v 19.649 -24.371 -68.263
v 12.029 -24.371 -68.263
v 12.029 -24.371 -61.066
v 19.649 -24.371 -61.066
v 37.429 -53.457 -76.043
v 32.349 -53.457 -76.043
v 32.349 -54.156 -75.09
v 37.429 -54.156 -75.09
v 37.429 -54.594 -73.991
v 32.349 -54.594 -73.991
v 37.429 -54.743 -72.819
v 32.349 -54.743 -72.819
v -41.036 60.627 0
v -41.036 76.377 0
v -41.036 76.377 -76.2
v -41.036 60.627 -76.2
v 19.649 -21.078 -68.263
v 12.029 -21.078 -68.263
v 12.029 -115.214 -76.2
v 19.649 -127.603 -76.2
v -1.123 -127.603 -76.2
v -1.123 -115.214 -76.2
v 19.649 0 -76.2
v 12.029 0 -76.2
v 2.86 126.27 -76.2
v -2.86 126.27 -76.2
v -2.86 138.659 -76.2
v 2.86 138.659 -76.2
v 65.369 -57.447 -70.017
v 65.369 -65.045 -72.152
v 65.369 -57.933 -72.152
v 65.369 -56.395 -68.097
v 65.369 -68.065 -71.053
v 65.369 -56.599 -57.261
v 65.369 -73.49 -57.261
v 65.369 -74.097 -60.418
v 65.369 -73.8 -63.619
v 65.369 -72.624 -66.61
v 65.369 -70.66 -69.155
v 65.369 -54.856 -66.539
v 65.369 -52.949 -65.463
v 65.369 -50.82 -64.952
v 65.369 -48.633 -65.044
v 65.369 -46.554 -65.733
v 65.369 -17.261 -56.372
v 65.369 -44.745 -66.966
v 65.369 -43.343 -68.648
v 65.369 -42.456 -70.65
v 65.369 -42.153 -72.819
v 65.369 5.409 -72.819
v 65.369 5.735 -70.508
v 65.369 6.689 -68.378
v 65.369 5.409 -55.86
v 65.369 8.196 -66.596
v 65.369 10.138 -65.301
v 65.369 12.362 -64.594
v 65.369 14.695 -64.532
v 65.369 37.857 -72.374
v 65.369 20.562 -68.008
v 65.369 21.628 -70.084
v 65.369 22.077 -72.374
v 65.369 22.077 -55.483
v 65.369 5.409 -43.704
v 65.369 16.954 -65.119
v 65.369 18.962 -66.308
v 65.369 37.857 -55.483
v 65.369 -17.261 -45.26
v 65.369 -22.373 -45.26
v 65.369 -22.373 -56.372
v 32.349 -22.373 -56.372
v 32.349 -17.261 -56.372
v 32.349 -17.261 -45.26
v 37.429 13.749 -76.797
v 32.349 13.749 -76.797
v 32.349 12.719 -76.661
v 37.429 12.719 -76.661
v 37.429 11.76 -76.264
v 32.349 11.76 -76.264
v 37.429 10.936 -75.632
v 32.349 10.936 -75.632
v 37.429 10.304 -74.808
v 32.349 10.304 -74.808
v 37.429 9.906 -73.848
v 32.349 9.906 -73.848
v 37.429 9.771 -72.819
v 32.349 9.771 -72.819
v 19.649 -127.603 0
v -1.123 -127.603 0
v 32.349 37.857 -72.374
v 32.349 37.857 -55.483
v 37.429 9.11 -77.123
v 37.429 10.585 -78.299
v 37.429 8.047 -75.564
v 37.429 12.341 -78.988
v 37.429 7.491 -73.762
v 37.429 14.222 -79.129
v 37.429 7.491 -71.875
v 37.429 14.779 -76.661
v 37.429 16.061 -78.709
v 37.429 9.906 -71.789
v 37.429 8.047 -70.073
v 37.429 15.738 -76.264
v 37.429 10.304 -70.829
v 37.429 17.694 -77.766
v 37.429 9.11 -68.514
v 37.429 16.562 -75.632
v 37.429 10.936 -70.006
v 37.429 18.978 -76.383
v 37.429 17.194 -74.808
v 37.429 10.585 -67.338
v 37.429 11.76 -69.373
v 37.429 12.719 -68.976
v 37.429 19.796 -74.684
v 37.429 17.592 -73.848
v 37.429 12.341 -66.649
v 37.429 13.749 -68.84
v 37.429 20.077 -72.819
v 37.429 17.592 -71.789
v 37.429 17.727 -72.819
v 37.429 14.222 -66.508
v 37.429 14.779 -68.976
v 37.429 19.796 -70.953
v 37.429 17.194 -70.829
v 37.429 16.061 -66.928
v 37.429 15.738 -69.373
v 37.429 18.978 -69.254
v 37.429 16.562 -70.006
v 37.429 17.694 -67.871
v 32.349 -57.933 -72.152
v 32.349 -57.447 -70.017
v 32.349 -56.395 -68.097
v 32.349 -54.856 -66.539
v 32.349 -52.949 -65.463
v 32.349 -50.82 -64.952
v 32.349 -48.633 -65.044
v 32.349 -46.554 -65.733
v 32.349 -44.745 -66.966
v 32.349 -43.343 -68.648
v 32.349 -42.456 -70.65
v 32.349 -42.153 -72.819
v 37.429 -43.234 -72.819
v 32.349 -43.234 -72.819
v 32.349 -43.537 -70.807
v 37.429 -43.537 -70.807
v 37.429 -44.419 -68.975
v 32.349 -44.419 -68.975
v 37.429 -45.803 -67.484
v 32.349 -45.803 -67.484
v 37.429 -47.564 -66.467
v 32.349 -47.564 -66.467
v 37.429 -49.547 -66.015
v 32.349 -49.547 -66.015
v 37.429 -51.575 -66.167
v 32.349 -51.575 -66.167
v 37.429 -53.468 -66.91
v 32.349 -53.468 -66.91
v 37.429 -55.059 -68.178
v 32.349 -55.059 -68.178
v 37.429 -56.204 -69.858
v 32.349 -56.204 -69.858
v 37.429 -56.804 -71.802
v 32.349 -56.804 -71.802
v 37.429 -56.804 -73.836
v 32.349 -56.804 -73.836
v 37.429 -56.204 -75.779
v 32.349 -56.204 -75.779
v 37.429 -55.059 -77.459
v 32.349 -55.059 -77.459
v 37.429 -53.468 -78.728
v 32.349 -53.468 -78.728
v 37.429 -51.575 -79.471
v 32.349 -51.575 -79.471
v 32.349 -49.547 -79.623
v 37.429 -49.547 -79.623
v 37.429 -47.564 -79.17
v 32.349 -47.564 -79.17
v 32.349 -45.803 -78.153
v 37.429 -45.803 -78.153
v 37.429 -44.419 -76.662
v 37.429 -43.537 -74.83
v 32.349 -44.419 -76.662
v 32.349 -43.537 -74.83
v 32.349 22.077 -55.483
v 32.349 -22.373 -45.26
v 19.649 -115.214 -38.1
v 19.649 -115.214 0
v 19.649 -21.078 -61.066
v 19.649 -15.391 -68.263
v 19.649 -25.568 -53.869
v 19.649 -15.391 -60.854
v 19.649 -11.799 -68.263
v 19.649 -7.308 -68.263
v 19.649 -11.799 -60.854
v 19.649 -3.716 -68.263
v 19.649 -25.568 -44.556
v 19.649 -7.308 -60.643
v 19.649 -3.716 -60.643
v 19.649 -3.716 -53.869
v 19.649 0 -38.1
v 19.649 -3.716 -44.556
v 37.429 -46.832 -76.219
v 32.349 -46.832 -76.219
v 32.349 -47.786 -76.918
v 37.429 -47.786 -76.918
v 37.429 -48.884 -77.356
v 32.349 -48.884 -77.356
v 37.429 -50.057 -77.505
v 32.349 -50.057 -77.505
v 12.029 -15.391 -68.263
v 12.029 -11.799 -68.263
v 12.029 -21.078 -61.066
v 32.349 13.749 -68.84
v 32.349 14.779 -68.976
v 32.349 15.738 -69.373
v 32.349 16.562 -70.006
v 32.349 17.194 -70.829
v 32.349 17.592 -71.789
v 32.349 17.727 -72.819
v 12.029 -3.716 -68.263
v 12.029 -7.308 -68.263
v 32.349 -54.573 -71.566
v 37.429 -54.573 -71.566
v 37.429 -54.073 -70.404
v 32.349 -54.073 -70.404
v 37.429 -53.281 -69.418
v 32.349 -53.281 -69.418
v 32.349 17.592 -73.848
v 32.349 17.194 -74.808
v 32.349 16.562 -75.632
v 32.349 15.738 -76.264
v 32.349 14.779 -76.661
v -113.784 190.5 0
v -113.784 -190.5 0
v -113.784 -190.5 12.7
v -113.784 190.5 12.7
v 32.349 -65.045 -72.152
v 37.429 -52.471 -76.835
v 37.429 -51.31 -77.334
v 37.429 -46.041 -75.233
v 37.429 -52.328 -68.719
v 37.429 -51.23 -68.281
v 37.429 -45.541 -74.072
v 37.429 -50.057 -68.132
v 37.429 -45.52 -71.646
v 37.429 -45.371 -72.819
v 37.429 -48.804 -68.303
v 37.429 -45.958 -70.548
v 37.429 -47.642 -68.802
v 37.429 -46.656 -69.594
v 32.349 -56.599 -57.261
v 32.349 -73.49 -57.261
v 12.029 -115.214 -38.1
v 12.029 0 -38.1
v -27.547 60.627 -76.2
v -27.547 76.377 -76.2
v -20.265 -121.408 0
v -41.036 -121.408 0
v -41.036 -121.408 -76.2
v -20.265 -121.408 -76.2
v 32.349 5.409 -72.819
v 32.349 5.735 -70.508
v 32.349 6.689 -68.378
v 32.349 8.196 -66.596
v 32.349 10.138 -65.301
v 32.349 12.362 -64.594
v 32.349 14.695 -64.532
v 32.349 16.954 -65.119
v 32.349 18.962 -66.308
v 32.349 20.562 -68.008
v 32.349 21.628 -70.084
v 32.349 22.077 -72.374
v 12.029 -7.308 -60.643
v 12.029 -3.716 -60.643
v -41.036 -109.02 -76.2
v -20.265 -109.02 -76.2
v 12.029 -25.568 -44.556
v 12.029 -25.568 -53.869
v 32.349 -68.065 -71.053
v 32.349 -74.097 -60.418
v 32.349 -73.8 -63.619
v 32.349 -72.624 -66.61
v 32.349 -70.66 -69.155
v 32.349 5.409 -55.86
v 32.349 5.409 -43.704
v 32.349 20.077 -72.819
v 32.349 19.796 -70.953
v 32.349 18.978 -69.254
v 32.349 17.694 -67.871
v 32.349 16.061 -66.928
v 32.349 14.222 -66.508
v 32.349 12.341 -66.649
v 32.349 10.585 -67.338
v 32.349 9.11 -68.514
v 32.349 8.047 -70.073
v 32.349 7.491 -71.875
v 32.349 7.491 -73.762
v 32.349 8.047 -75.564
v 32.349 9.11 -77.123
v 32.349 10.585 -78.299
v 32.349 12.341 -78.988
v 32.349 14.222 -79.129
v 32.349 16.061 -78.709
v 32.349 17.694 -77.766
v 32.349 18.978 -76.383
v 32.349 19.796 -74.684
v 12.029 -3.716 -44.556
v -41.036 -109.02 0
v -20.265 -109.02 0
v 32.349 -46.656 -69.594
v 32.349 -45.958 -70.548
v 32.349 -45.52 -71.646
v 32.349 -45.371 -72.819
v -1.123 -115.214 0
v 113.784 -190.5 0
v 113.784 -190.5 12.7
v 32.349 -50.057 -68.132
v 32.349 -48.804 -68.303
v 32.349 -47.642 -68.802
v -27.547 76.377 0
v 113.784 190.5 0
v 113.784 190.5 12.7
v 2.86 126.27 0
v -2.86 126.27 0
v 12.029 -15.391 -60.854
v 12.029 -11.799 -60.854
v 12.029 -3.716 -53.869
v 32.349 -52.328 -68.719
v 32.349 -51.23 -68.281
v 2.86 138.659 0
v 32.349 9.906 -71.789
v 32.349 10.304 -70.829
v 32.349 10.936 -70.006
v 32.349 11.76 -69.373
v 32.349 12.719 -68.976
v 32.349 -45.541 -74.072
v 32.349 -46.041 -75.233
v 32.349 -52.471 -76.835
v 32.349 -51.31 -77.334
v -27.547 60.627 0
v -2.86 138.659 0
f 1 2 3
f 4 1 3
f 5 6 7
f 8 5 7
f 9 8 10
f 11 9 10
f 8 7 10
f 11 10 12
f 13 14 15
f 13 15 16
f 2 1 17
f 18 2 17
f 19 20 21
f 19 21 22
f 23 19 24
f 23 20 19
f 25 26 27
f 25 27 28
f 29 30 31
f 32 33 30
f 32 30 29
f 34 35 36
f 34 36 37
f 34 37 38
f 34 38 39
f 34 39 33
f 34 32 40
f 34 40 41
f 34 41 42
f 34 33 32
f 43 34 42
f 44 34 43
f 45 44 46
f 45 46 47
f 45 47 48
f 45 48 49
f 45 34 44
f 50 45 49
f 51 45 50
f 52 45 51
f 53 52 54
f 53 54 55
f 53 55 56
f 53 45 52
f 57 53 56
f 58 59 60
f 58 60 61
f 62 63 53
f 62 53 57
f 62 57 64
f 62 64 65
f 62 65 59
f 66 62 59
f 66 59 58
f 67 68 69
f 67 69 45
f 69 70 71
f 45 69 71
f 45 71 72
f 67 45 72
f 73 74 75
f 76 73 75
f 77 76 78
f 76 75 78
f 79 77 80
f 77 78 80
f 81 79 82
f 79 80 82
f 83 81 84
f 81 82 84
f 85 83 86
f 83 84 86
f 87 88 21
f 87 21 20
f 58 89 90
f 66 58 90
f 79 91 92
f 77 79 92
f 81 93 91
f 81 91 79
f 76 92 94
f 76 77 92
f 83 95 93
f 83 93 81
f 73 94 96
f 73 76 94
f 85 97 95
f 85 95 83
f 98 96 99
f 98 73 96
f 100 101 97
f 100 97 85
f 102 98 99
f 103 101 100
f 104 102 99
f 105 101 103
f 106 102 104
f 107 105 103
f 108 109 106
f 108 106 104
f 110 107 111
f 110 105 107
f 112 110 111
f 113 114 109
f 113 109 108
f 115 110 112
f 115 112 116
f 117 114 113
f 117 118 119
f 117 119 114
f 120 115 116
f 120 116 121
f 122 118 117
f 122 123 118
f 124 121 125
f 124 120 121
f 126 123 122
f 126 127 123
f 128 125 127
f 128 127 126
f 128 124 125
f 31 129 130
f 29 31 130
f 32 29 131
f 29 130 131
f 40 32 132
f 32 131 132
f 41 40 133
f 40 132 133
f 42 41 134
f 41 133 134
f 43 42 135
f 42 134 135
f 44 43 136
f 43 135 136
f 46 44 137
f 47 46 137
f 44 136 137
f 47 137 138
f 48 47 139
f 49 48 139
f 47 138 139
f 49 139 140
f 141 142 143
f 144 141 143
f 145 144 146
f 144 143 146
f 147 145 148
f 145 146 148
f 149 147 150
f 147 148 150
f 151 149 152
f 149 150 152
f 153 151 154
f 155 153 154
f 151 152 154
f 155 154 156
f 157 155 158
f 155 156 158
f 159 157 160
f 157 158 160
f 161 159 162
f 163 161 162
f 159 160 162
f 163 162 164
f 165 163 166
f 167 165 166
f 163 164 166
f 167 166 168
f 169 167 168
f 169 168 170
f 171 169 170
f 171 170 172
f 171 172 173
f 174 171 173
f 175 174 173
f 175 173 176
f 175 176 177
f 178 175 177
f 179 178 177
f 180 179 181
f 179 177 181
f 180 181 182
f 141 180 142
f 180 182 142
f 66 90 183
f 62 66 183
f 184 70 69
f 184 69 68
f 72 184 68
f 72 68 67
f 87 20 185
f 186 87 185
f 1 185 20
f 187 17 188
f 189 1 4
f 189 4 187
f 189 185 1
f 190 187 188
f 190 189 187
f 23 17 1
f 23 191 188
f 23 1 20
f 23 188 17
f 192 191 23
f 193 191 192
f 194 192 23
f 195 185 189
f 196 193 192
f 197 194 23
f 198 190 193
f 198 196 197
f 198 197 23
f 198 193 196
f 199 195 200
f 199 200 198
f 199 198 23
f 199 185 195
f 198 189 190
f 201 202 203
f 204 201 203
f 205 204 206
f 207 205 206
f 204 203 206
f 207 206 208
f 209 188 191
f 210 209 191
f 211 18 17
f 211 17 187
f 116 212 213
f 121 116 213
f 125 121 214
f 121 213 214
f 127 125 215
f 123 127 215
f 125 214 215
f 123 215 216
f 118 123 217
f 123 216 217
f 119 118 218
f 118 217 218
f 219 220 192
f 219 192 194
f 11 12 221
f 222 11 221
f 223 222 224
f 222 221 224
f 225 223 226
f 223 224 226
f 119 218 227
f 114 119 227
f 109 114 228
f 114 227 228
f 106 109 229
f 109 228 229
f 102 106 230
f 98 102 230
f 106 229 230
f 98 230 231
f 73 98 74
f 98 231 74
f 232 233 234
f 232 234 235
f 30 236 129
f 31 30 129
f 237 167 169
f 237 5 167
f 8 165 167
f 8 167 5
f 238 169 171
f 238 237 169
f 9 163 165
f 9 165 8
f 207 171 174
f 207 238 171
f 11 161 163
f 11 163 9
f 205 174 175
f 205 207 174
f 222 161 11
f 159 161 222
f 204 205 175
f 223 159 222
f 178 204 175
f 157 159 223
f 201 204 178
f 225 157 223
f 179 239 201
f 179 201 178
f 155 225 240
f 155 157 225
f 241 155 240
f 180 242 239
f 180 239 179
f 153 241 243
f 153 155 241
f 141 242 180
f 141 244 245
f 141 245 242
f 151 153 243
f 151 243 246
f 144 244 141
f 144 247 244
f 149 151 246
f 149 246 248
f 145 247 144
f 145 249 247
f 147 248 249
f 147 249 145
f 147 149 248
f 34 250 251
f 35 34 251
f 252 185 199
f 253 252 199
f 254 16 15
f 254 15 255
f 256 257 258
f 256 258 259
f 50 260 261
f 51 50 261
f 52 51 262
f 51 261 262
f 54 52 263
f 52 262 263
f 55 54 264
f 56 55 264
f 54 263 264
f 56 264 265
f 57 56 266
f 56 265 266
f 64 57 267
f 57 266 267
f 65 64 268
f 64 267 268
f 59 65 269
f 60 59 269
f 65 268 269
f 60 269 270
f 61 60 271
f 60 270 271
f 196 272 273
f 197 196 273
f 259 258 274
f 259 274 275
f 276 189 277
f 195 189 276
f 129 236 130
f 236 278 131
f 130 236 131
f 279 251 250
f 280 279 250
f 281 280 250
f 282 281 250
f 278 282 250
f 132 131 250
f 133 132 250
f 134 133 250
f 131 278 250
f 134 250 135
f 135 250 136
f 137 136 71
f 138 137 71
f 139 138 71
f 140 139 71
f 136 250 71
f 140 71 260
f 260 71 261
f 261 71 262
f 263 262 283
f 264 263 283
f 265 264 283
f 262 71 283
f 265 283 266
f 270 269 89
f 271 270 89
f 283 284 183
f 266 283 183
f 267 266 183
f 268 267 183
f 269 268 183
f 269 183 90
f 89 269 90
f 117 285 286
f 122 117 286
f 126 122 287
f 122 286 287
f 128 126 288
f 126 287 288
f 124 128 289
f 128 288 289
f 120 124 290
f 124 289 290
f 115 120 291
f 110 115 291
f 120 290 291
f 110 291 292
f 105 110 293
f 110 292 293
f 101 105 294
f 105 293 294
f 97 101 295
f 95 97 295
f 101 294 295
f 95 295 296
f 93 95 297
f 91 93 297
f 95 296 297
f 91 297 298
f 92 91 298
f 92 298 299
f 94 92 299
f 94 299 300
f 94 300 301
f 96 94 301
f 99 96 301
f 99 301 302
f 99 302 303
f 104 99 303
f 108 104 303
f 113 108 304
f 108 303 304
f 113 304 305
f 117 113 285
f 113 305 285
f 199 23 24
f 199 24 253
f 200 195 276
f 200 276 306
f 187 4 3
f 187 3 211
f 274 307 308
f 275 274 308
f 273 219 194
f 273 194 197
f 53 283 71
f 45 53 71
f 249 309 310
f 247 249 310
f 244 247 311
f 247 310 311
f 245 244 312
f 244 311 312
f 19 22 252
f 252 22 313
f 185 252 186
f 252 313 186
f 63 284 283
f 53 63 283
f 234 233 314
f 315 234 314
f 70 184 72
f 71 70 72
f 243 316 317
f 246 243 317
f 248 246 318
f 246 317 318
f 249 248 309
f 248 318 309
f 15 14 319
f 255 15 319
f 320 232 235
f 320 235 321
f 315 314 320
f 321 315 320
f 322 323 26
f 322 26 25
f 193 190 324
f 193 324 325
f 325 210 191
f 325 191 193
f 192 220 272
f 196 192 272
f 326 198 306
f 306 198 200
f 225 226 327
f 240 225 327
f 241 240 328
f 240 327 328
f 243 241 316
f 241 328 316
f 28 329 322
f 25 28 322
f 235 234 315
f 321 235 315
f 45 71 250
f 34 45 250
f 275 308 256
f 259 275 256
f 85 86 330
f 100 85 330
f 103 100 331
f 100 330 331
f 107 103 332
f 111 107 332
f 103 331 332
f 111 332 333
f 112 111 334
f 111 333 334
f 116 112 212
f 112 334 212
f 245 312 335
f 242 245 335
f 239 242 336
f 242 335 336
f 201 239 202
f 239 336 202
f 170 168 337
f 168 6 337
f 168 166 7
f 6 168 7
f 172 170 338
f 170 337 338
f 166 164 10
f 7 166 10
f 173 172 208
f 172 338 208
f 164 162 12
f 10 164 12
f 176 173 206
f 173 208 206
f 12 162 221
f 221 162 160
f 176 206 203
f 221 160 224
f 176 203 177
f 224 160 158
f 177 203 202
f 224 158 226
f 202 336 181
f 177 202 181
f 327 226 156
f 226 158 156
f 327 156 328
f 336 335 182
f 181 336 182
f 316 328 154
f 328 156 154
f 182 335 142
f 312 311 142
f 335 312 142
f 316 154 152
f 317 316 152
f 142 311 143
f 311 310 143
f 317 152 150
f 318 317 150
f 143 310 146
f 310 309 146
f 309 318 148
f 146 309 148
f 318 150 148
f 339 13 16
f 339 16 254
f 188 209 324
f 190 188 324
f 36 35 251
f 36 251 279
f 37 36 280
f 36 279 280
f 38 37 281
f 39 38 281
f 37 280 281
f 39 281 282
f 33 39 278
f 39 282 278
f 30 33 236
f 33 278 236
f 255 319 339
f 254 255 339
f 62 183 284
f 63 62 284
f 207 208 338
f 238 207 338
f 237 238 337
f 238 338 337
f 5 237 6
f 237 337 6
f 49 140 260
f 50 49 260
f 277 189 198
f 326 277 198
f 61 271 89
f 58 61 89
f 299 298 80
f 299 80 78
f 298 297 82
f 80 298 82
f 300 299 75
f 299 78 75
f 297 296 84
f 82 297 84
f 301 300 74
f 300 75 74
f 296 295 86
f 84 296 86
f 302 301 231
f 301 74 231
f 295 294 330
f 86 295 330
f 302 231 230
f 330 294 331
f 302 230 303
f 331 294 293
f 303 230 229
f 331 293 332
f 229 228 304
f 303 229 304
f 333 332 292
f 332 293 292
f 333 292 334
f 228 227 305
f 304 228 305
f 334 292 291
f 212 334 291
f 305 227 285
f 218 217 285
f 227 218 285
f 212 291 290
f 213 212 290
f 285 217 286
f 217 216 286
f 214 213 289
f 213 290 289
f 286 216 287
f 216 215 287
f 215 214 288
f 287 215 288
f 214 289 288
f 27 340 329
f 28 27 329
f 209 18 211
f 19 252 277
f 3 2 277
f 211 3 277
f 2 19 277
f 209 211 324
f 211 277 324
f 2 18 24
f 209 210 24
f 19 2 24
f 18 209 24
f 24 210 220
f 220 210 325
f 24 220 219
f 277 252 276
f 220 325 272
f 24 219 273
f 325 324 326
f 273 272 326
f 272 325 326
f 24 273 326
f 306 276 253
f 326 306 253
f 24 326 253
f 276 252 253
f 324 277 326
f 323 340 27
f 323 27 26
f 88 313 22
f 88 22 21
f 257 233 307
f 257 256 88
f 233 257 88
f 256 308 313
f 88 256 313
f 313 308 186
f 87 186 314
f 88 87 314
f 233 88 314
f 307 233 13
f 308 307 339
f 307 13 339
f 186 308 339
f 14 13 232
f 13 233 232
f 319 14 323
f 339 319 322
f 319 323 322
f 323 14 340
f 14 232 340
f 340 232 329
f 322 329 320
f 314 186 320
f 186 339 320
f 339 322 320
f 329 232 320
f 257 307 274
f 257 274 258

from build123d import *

# Parameters (mm, degrees)
F0_W      = 227.5685612466
F0_H      = 381
F1_DEPTH  = 12.7
F2_W      = 5.7198144495
F2_H      = 12.3888067901
F2_W_2    = 13.4890703484
F2_H_2    = 15.7491192222
F3_DEPTH  = 25.4
F2_W_3    = 20.7718969323
F4_DEPTH  = 76.2
F5_W      = 115.214029327
F5_H      = 38.1
F6_DEPTH  = 7.62
F7_W      = 21.851953119
F7_H      = 9.3133300543
F7_W_2    = 3.2927580178
F7_H_2    = 7.1966685355
F7_W_3    = 3.5920999944
F7_H_3    = 7.4083320796
F7_W_4    = 3.5921037197
F7_H_4    = 7.6199993491
F8_DEPTH  = 133.4340272107
F12_DEPTH = 33.02
F11_W     = 5.1117502153
F11_H     = 11.1124999821
F11_R     = 6.8230577634
F13_DEPTH = 5.08
F11_R_2   = 6.3281995519
F14_DEPTH = 33.02


with BuildPart() as f1:
    # F0 (on Top) → F1 (new body)
    with BuildSketch(Plane.XY):
        Rectangle(F0_W, F0_H)
    extrude(amount=F1_DEPTH)

    # F2 (on face) → F3 (join)
    with BuildSketch(Plane(origin=(0, 0, 0), x_dir=(1, 0, 0), z_dir=(0, 0, -1))):
        with Locations((0, -132.4641108513)):
            Rectangle(F2_W, F2_H)
        with Locations((-34.2918671668, -68.5019493103)):
            Rectangle(F2_W_2, F2_H_2)
    extrude(amount=F3_DEPTH)

    # F2 (on face) → F4 (join)
    with BuildSketch(Plane(origin=(0, 0, 0), x_dir=(1, 0, 0), z_dir=(0, 0, -1))):
        with Locations((0, -132.4641108513)):
            Rectangle(F2_W, F2_H)
        with Locations((-34.2918671668, -68.5019493103)):
            Rectangle(F2_W_2, F2_H_2)
        with Locations((9.2627981212, 121.4084327221)):
            Rectangle(F2_W_3, F2_H)
        with Locations((-30.6504538748, 115.214029327)):
            Rectangle(F2_W_3, F2_H)
    extrude(amount=F4_DEPTH)

    # F5 (on face) → F6 (join)
    with BuildSketch(Plane.YZ.offset(19.6487465873)):
        with Locations((-57.6070146635, -57.15)):
            Rectangle(F5_W, F5_H)
    extrude(amount=-F6_DEPTH)

    # F7 (on face) → F8 (cut, through all)
    with BuildSketch(Plane.YZ.offset(19.6487465873)):
        with Locations((-14.6423373371, -49.212500453)):
            Rectangle(F7_W, F7_H)
        with Locations((-22.7245669812, -64.6641682833)):
            Rectangle(F7_W_2, F7_H_2)
        with Locations((-13.5946366936, -64.5583365113)):
            Rectangle(F7_W_3, F7_H_3)
        with Locations((-5.5124126375, -64.4525028765)):
            Rectangle(F7_W_4, F7_H_4)
    extrude(amount=-F8_DEPTH, mode=Mode.SUBTRACT)


with BuildPart() as f12:
    # F11 (on offset) → F12 (new body)
    with BuildSketch(Plane.YZ.offset(32.3487465873)):
        with BuildLine():
            ThreePointArc((-57.9326376319, -72.151876986), (-49.7231741627, -64.9217132577), (-42.1528853476, -72.8186294436))
            Line((-42.1528853476, -72.8186294436), (5.4086139426, -72.8186294436))
            Line((5.4086139426, -72.8186294436), (5.4086139426, -55.8598177097))
            Line((5.4086139426, -55.8598177097), (-17.2608867288, -56.3721247017))
            Line((-17.2608867288, -56.3721247017), (-56.5991364419, -57.2611279786))
            Line((-56.5991364419, -57.2611279786), (-73.4901353717, -57.2611279786))
            ThreePointArc((-73.4901353717, -57.2611279786), (-72.6236893565, -66.6100777312), (-65.0446359068, -72.151876986))
            Line((-65.0446359068, -72.151876986), (-57.9326376319, -72.151876986))
        make_face()
        with BuildLine():
            Line((5.4086139426, -55.8598177097), (5.4086139426, -72.8186294436))
            ThreePointArc((5.4086139426, -72.8186294436), (13.5265818153, -64.4812919947), (22.0773629844, -72.3741203547))
            Line((22.0773629844, -72.3741203547), (37.8571152687, -72.3741203547))
            Line((37.8571152687, -72.3741203547), (37.8571152687, -55.4831214249))
            Line((37.8571152687, -55.4831214249), (22.0773629844, -55.4831214249))
            Line((22.0773629844, -55.4831214249), (5.4086139426, -55.8598177097))
        make_face()
    extrude(amount=F12_DEPTH)

    # F11 (on offset) → F14 (join)
    with BuildSketch(Plane.YZ.offset(32.3487465873)):
        Polygon((5.4086139426, -43.7038764358), (5.4086139426, -55.8598177097), (22.0773629844, -55.4831214249), align=None)
    extrude(amount=F14_DEPTH)


with BuildPart() as f12b:
    # F11 (on offset) → F12, piece 2 (new body)
    with BuildSketch(Plane.YZ.offset(32.3487465873)):
        with Locations((-19.8167618364, -50.8158747107)):
            Rectangle(F11_W, F11_H)
    extrude(amount=F12_DEPTH)


with BuildPart() as f13:
    # F11 (on offset) → F13 (new body)
    with BuildSketch(Plane.YZ.offset(32.3487465873)):
        with Locations((-50.0568478592, -72.8186294436)):
            Circle(F11_R)
        with BuildLine():
            ThreePointArc((-46.6563293903, -69.5941245821), (-45.703880836, -71.0829348983), (-45.3705958963, -72.8186294436))
            ThreePointArc((-45.3705958963, -72.8186294436), (-45.7515139757, -74.6693205609), (-46.8323429976, -76.2191479125))
            ThreePointArc((-46.8323429976, -76.2191479125), (-48.3211533138, -77.1715964668), (-50.0568478592, -77.5048814065))
            ThreePointArc((-50.0568478592, -77.5048814065), (-51.9075389764, -77.1239633271), (-53.4573663281, -76.0431343052))
            ThreePointArc((-53.4573663281, -76.0431343052), (-54.4098148823, -74.554323989), (-54.743099822, -72.8186294436))
            ThreePointArc((-54.743099822, -72.8186294436), (-54.3621817426, -70.9679383264), (-53.2813527207, -69.4181109747))
            ThreePointArc((-53.2813527207, -69.4181109747), (-51.7925424045, -68.4656624205), (-50.0568478592, -68.1323774808))
            ThreePointArc((-50.0568478592, -68.1323774808), (-48.2061567419, -68.5132955602), (-46.6563293903, -69.5941245821))
        make_face(mode=Mode.SUBTRACT)
    extrude(amount=F13_DEPTH)


with BuildPart() as f13b:
    # F11 (on offset) → F13, piece 2 (new body)
    with BuildSketch(Plane.YZ.offset(32.3487465873)):
        with Locations((13.7489153729, -72.8186294436)):
            Circle(F11_R_2)
        with BuildLine():
            ThreePointArc((13.7489153729, -68.8402636502), (16.5620448034, -70.0055000131), (17.7272811663, -72.8186294436))
            ThreePointArc((17.7272811663, -72.8186294436), (16.5620448034, -75.6317588742), (13.7489153729, -76.7969952371))
            ThreePointArc((13.7489153729, -76.7969952371), (10.9357859423, -75.6317588742), (9.7705495795, -72.8186294436))
            ThreePointArc((9.7705495795, -72.8186294436), (10.9357859423, -70.0055000131), (13.7489153729, -68.8402636502))
        make_face(mode=Mode.SUBTRACT)
    extrude(amount=F13_DEPTH)


solid = Compound([f1.part, f12.part, f12b.part, f13.part, f13b.part])
